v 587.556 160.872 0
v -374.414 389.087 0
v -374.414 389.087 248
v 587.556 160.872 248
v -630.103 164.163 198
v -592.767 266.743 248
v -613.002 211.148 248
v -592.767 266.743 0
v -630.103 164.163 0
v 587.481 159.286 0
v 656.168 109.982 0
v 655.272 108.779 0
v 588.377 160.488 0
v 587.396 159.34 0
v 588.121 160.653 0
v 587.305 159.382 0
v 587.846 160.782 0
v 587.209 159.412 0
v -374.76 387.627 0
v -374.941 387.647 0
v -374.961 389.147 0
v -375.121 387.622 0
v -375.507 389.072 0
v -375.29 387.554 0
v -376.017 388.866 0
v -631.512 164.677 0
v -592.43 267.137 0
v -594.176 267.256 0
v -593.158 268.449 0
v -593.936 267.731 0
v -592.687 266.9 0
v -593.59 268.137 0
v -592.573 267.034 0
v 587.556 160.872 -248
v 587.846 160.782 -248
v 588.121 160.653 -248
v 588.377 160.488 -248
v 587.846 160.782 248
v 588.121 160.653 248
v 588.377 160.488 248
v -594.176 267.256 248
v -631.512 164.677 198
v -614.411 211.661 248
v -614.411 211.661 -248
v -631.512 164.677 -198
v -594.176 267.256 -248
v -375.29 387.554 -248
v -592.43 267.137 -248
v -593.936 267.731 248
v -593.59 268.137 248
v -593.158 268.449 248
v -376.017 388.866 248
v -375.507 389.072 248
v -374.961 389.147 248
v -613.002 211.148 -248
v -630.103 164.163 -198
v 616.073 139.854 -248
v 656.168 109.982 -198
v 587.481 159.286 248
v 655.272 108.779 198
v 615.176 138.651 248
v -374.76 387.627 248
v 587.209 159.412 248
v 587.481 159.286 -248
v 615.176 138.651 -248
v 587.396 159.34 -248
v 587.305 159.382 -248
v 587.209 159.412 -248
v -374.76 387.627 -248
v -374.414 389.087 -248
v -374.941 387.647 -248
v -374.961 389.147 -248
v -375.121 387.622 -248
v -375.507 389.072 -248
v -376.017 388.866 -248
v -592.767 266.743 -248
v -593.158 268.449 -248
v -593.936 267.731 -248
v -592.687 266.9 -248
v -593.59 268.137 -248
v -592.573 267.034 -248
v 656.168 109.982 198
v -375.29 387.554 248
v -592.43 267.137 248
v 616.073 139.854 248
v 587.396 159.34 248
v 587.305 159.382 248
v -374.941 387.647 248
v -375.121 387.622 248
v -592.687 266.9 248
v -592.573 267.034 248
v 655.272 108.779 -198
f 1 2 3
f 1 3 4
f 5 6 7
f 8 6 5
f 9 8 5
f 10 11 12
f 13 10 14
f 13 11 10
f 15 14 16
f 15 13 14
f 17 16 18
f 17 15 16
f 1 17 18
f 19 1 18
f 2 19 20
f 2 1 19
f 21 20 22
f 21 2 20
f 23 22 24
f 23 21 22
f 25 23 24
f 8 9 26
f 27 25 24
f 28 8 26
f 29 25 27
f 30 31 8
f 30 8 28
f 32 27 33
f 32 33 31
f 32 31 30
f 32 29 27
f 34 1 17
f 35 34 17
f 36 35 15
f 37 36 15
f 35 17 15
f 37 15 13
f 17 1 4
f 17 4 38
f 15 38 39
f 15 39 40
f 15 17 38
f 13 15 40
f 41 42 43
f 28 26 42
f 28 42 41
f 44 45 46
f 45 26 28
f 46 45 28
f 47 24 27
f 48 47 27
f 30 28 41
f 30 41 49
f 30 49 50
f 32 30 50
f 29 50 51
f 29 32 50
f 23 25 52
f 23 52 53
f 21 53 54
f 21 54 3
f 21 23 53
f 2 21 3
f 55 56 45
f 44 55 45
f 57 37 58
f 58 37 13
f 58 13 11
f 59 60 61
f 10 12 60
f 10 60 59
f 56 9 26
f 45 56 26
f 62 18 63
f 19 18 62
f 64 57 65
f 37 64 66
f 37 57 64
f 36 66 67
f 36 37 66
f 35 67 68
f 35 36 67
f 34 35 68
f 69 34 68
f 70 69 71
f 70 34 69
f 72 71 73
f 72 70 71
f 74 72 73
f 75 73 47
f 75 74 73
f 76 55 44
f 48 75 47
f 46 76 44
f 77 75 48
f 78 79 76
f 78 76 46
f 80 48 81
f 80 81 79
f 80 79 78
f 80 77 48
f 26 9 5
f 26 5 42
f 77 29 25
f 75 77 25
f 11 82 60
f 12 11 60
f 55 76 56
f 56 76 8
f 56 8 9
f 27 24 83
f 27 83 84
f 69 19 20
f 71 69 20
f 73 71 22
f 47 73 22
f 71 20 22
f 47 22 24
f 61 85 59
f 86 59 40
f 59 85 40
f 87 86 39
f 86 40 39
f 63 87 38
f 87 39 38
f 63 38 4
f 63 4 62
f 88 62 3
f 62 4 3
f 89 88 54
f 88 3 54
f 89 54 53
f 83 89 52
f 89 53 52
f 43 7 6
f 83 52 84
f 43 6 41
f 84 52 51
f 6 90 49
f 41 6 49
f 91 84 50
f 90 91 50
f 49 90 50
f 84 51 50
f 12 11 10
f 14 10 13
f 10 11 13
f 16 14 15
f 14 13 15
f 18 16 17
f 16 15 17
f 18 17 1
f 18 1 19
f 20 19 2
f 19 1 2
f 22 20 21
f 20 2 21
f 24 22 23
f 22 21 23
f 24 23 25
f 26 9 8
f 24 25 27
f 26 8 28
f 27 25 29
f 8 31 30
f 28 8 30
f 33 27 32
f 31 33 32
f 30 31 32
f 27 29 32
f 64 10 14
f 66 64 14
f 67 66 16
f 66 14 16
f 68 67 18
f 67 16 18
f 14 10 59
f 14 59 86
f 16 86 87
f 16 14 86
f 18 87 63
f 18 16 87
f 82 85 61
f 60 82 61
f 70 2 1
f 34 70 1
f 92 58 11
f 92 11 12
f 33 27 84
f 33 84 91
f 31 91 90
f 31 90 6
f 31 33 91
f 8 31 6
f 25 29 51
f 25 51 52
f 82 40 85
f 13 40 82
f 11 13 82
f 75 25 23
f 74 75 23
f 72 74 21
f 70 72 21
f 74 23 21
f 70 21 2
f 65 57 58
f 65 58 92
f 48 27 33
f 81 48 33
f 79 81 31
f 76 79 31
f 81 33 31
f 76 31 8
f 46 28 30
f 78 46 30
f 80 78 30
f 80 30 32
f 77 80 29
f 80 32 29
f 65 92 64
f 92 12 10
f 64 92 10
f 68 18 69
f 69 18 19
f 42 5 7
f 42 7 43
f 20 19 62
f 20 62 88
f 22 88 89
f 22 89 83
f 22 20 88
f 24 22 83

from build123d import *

# Parameters (mm, degrees)
SM_BASE_FLANGE_1_DEPTH = 248
CHAMFER_1_SIZE         = 50


# Sheet-metal steps are written as plain solids
with BuildPart() as part:
    # Sketch 1 → Базовая кромка1 (new body)
    with BuildSketch(Plane.XY):
        with BuildLine():
            Line((-631.512294125, 164.676509864), (-594.176437308, 267.255933406))
            ThreePointArc((-594.176437308, 267.255933406), (-593.774974301, 267.944409031), (-593.157874046, 268.448748705))
            Line((-593.157874046, 268.448748705), (-376.017310888, 388.866020848))
            ThreePointArc((-376.017310888, 388.866020848), (-375.23622418, 389.126182817), (-374.413902548, 389.086586981))
            Line((-374.413902548, 389.086586981), (587.555538712, 160.871606081))
            ThreePointArc((587.555538712, 160.871606081), (587.985726672, 160.721956923), (588.376749927, 160.488381743))
            Line((588.376749927, 160.488381743), (656.168217212, 109.982187653))
            Line((656.168217212, 109.982187653), (655.272053364, 108.779320098))
            Line((655.272053364, 108.779320098), (587.480586079, 159.285514187))
            ThreePointArc((587.480586079, 159.285514187), (587.351408753, 159.362677417), (587.209293088, 159.412115085))
            Line((587.209293088, 159.412115085), (-374.760148172, 387.627095985))
            ThreePointArc((-374.760148172, 387.627095985), (-375.031807997, 387.640176753), (-375.28984557, 387.554230388))
            Line((-375.28984557, 387.554230388), (-592.430408728, 267.136958245))
            ThreePointArc((-592.430408728, 267.136958245), (-592.634272205, 266.970346031), (-592.766898377, 266.742903191))
            Line((-592.766898377, 266.742903191), (-630.102755194, 164.163479649))
            Line((-630.102755194, 164.163479649), (-631.512294125, 164.676509864))
        make_face()
    extrude(amount=SM_BASE_FLANGE_1_DEPTH)

    # Фаска1
    chamfer_1_edges = [part.edges().sort_by_distance(p)[0] for p in [
        (-630.80752466, 164.419994757, 248),
        (655.720135288, 109.380753875, 248),
    ]]
    chamfer(chamfer_1_edges, length=CHAMFER_1_SIZE)


with BuildPart() as body_2:
    # Зеркальное отражение1: mirrored copy
    add(part.part.mirror(Plane(origin=(587.480586079, 159.285514187, 0), x_dir=(1, 0, 0), z_dir=(0, 0, -1))))


solid = Compound([part.part, body_2.part])
